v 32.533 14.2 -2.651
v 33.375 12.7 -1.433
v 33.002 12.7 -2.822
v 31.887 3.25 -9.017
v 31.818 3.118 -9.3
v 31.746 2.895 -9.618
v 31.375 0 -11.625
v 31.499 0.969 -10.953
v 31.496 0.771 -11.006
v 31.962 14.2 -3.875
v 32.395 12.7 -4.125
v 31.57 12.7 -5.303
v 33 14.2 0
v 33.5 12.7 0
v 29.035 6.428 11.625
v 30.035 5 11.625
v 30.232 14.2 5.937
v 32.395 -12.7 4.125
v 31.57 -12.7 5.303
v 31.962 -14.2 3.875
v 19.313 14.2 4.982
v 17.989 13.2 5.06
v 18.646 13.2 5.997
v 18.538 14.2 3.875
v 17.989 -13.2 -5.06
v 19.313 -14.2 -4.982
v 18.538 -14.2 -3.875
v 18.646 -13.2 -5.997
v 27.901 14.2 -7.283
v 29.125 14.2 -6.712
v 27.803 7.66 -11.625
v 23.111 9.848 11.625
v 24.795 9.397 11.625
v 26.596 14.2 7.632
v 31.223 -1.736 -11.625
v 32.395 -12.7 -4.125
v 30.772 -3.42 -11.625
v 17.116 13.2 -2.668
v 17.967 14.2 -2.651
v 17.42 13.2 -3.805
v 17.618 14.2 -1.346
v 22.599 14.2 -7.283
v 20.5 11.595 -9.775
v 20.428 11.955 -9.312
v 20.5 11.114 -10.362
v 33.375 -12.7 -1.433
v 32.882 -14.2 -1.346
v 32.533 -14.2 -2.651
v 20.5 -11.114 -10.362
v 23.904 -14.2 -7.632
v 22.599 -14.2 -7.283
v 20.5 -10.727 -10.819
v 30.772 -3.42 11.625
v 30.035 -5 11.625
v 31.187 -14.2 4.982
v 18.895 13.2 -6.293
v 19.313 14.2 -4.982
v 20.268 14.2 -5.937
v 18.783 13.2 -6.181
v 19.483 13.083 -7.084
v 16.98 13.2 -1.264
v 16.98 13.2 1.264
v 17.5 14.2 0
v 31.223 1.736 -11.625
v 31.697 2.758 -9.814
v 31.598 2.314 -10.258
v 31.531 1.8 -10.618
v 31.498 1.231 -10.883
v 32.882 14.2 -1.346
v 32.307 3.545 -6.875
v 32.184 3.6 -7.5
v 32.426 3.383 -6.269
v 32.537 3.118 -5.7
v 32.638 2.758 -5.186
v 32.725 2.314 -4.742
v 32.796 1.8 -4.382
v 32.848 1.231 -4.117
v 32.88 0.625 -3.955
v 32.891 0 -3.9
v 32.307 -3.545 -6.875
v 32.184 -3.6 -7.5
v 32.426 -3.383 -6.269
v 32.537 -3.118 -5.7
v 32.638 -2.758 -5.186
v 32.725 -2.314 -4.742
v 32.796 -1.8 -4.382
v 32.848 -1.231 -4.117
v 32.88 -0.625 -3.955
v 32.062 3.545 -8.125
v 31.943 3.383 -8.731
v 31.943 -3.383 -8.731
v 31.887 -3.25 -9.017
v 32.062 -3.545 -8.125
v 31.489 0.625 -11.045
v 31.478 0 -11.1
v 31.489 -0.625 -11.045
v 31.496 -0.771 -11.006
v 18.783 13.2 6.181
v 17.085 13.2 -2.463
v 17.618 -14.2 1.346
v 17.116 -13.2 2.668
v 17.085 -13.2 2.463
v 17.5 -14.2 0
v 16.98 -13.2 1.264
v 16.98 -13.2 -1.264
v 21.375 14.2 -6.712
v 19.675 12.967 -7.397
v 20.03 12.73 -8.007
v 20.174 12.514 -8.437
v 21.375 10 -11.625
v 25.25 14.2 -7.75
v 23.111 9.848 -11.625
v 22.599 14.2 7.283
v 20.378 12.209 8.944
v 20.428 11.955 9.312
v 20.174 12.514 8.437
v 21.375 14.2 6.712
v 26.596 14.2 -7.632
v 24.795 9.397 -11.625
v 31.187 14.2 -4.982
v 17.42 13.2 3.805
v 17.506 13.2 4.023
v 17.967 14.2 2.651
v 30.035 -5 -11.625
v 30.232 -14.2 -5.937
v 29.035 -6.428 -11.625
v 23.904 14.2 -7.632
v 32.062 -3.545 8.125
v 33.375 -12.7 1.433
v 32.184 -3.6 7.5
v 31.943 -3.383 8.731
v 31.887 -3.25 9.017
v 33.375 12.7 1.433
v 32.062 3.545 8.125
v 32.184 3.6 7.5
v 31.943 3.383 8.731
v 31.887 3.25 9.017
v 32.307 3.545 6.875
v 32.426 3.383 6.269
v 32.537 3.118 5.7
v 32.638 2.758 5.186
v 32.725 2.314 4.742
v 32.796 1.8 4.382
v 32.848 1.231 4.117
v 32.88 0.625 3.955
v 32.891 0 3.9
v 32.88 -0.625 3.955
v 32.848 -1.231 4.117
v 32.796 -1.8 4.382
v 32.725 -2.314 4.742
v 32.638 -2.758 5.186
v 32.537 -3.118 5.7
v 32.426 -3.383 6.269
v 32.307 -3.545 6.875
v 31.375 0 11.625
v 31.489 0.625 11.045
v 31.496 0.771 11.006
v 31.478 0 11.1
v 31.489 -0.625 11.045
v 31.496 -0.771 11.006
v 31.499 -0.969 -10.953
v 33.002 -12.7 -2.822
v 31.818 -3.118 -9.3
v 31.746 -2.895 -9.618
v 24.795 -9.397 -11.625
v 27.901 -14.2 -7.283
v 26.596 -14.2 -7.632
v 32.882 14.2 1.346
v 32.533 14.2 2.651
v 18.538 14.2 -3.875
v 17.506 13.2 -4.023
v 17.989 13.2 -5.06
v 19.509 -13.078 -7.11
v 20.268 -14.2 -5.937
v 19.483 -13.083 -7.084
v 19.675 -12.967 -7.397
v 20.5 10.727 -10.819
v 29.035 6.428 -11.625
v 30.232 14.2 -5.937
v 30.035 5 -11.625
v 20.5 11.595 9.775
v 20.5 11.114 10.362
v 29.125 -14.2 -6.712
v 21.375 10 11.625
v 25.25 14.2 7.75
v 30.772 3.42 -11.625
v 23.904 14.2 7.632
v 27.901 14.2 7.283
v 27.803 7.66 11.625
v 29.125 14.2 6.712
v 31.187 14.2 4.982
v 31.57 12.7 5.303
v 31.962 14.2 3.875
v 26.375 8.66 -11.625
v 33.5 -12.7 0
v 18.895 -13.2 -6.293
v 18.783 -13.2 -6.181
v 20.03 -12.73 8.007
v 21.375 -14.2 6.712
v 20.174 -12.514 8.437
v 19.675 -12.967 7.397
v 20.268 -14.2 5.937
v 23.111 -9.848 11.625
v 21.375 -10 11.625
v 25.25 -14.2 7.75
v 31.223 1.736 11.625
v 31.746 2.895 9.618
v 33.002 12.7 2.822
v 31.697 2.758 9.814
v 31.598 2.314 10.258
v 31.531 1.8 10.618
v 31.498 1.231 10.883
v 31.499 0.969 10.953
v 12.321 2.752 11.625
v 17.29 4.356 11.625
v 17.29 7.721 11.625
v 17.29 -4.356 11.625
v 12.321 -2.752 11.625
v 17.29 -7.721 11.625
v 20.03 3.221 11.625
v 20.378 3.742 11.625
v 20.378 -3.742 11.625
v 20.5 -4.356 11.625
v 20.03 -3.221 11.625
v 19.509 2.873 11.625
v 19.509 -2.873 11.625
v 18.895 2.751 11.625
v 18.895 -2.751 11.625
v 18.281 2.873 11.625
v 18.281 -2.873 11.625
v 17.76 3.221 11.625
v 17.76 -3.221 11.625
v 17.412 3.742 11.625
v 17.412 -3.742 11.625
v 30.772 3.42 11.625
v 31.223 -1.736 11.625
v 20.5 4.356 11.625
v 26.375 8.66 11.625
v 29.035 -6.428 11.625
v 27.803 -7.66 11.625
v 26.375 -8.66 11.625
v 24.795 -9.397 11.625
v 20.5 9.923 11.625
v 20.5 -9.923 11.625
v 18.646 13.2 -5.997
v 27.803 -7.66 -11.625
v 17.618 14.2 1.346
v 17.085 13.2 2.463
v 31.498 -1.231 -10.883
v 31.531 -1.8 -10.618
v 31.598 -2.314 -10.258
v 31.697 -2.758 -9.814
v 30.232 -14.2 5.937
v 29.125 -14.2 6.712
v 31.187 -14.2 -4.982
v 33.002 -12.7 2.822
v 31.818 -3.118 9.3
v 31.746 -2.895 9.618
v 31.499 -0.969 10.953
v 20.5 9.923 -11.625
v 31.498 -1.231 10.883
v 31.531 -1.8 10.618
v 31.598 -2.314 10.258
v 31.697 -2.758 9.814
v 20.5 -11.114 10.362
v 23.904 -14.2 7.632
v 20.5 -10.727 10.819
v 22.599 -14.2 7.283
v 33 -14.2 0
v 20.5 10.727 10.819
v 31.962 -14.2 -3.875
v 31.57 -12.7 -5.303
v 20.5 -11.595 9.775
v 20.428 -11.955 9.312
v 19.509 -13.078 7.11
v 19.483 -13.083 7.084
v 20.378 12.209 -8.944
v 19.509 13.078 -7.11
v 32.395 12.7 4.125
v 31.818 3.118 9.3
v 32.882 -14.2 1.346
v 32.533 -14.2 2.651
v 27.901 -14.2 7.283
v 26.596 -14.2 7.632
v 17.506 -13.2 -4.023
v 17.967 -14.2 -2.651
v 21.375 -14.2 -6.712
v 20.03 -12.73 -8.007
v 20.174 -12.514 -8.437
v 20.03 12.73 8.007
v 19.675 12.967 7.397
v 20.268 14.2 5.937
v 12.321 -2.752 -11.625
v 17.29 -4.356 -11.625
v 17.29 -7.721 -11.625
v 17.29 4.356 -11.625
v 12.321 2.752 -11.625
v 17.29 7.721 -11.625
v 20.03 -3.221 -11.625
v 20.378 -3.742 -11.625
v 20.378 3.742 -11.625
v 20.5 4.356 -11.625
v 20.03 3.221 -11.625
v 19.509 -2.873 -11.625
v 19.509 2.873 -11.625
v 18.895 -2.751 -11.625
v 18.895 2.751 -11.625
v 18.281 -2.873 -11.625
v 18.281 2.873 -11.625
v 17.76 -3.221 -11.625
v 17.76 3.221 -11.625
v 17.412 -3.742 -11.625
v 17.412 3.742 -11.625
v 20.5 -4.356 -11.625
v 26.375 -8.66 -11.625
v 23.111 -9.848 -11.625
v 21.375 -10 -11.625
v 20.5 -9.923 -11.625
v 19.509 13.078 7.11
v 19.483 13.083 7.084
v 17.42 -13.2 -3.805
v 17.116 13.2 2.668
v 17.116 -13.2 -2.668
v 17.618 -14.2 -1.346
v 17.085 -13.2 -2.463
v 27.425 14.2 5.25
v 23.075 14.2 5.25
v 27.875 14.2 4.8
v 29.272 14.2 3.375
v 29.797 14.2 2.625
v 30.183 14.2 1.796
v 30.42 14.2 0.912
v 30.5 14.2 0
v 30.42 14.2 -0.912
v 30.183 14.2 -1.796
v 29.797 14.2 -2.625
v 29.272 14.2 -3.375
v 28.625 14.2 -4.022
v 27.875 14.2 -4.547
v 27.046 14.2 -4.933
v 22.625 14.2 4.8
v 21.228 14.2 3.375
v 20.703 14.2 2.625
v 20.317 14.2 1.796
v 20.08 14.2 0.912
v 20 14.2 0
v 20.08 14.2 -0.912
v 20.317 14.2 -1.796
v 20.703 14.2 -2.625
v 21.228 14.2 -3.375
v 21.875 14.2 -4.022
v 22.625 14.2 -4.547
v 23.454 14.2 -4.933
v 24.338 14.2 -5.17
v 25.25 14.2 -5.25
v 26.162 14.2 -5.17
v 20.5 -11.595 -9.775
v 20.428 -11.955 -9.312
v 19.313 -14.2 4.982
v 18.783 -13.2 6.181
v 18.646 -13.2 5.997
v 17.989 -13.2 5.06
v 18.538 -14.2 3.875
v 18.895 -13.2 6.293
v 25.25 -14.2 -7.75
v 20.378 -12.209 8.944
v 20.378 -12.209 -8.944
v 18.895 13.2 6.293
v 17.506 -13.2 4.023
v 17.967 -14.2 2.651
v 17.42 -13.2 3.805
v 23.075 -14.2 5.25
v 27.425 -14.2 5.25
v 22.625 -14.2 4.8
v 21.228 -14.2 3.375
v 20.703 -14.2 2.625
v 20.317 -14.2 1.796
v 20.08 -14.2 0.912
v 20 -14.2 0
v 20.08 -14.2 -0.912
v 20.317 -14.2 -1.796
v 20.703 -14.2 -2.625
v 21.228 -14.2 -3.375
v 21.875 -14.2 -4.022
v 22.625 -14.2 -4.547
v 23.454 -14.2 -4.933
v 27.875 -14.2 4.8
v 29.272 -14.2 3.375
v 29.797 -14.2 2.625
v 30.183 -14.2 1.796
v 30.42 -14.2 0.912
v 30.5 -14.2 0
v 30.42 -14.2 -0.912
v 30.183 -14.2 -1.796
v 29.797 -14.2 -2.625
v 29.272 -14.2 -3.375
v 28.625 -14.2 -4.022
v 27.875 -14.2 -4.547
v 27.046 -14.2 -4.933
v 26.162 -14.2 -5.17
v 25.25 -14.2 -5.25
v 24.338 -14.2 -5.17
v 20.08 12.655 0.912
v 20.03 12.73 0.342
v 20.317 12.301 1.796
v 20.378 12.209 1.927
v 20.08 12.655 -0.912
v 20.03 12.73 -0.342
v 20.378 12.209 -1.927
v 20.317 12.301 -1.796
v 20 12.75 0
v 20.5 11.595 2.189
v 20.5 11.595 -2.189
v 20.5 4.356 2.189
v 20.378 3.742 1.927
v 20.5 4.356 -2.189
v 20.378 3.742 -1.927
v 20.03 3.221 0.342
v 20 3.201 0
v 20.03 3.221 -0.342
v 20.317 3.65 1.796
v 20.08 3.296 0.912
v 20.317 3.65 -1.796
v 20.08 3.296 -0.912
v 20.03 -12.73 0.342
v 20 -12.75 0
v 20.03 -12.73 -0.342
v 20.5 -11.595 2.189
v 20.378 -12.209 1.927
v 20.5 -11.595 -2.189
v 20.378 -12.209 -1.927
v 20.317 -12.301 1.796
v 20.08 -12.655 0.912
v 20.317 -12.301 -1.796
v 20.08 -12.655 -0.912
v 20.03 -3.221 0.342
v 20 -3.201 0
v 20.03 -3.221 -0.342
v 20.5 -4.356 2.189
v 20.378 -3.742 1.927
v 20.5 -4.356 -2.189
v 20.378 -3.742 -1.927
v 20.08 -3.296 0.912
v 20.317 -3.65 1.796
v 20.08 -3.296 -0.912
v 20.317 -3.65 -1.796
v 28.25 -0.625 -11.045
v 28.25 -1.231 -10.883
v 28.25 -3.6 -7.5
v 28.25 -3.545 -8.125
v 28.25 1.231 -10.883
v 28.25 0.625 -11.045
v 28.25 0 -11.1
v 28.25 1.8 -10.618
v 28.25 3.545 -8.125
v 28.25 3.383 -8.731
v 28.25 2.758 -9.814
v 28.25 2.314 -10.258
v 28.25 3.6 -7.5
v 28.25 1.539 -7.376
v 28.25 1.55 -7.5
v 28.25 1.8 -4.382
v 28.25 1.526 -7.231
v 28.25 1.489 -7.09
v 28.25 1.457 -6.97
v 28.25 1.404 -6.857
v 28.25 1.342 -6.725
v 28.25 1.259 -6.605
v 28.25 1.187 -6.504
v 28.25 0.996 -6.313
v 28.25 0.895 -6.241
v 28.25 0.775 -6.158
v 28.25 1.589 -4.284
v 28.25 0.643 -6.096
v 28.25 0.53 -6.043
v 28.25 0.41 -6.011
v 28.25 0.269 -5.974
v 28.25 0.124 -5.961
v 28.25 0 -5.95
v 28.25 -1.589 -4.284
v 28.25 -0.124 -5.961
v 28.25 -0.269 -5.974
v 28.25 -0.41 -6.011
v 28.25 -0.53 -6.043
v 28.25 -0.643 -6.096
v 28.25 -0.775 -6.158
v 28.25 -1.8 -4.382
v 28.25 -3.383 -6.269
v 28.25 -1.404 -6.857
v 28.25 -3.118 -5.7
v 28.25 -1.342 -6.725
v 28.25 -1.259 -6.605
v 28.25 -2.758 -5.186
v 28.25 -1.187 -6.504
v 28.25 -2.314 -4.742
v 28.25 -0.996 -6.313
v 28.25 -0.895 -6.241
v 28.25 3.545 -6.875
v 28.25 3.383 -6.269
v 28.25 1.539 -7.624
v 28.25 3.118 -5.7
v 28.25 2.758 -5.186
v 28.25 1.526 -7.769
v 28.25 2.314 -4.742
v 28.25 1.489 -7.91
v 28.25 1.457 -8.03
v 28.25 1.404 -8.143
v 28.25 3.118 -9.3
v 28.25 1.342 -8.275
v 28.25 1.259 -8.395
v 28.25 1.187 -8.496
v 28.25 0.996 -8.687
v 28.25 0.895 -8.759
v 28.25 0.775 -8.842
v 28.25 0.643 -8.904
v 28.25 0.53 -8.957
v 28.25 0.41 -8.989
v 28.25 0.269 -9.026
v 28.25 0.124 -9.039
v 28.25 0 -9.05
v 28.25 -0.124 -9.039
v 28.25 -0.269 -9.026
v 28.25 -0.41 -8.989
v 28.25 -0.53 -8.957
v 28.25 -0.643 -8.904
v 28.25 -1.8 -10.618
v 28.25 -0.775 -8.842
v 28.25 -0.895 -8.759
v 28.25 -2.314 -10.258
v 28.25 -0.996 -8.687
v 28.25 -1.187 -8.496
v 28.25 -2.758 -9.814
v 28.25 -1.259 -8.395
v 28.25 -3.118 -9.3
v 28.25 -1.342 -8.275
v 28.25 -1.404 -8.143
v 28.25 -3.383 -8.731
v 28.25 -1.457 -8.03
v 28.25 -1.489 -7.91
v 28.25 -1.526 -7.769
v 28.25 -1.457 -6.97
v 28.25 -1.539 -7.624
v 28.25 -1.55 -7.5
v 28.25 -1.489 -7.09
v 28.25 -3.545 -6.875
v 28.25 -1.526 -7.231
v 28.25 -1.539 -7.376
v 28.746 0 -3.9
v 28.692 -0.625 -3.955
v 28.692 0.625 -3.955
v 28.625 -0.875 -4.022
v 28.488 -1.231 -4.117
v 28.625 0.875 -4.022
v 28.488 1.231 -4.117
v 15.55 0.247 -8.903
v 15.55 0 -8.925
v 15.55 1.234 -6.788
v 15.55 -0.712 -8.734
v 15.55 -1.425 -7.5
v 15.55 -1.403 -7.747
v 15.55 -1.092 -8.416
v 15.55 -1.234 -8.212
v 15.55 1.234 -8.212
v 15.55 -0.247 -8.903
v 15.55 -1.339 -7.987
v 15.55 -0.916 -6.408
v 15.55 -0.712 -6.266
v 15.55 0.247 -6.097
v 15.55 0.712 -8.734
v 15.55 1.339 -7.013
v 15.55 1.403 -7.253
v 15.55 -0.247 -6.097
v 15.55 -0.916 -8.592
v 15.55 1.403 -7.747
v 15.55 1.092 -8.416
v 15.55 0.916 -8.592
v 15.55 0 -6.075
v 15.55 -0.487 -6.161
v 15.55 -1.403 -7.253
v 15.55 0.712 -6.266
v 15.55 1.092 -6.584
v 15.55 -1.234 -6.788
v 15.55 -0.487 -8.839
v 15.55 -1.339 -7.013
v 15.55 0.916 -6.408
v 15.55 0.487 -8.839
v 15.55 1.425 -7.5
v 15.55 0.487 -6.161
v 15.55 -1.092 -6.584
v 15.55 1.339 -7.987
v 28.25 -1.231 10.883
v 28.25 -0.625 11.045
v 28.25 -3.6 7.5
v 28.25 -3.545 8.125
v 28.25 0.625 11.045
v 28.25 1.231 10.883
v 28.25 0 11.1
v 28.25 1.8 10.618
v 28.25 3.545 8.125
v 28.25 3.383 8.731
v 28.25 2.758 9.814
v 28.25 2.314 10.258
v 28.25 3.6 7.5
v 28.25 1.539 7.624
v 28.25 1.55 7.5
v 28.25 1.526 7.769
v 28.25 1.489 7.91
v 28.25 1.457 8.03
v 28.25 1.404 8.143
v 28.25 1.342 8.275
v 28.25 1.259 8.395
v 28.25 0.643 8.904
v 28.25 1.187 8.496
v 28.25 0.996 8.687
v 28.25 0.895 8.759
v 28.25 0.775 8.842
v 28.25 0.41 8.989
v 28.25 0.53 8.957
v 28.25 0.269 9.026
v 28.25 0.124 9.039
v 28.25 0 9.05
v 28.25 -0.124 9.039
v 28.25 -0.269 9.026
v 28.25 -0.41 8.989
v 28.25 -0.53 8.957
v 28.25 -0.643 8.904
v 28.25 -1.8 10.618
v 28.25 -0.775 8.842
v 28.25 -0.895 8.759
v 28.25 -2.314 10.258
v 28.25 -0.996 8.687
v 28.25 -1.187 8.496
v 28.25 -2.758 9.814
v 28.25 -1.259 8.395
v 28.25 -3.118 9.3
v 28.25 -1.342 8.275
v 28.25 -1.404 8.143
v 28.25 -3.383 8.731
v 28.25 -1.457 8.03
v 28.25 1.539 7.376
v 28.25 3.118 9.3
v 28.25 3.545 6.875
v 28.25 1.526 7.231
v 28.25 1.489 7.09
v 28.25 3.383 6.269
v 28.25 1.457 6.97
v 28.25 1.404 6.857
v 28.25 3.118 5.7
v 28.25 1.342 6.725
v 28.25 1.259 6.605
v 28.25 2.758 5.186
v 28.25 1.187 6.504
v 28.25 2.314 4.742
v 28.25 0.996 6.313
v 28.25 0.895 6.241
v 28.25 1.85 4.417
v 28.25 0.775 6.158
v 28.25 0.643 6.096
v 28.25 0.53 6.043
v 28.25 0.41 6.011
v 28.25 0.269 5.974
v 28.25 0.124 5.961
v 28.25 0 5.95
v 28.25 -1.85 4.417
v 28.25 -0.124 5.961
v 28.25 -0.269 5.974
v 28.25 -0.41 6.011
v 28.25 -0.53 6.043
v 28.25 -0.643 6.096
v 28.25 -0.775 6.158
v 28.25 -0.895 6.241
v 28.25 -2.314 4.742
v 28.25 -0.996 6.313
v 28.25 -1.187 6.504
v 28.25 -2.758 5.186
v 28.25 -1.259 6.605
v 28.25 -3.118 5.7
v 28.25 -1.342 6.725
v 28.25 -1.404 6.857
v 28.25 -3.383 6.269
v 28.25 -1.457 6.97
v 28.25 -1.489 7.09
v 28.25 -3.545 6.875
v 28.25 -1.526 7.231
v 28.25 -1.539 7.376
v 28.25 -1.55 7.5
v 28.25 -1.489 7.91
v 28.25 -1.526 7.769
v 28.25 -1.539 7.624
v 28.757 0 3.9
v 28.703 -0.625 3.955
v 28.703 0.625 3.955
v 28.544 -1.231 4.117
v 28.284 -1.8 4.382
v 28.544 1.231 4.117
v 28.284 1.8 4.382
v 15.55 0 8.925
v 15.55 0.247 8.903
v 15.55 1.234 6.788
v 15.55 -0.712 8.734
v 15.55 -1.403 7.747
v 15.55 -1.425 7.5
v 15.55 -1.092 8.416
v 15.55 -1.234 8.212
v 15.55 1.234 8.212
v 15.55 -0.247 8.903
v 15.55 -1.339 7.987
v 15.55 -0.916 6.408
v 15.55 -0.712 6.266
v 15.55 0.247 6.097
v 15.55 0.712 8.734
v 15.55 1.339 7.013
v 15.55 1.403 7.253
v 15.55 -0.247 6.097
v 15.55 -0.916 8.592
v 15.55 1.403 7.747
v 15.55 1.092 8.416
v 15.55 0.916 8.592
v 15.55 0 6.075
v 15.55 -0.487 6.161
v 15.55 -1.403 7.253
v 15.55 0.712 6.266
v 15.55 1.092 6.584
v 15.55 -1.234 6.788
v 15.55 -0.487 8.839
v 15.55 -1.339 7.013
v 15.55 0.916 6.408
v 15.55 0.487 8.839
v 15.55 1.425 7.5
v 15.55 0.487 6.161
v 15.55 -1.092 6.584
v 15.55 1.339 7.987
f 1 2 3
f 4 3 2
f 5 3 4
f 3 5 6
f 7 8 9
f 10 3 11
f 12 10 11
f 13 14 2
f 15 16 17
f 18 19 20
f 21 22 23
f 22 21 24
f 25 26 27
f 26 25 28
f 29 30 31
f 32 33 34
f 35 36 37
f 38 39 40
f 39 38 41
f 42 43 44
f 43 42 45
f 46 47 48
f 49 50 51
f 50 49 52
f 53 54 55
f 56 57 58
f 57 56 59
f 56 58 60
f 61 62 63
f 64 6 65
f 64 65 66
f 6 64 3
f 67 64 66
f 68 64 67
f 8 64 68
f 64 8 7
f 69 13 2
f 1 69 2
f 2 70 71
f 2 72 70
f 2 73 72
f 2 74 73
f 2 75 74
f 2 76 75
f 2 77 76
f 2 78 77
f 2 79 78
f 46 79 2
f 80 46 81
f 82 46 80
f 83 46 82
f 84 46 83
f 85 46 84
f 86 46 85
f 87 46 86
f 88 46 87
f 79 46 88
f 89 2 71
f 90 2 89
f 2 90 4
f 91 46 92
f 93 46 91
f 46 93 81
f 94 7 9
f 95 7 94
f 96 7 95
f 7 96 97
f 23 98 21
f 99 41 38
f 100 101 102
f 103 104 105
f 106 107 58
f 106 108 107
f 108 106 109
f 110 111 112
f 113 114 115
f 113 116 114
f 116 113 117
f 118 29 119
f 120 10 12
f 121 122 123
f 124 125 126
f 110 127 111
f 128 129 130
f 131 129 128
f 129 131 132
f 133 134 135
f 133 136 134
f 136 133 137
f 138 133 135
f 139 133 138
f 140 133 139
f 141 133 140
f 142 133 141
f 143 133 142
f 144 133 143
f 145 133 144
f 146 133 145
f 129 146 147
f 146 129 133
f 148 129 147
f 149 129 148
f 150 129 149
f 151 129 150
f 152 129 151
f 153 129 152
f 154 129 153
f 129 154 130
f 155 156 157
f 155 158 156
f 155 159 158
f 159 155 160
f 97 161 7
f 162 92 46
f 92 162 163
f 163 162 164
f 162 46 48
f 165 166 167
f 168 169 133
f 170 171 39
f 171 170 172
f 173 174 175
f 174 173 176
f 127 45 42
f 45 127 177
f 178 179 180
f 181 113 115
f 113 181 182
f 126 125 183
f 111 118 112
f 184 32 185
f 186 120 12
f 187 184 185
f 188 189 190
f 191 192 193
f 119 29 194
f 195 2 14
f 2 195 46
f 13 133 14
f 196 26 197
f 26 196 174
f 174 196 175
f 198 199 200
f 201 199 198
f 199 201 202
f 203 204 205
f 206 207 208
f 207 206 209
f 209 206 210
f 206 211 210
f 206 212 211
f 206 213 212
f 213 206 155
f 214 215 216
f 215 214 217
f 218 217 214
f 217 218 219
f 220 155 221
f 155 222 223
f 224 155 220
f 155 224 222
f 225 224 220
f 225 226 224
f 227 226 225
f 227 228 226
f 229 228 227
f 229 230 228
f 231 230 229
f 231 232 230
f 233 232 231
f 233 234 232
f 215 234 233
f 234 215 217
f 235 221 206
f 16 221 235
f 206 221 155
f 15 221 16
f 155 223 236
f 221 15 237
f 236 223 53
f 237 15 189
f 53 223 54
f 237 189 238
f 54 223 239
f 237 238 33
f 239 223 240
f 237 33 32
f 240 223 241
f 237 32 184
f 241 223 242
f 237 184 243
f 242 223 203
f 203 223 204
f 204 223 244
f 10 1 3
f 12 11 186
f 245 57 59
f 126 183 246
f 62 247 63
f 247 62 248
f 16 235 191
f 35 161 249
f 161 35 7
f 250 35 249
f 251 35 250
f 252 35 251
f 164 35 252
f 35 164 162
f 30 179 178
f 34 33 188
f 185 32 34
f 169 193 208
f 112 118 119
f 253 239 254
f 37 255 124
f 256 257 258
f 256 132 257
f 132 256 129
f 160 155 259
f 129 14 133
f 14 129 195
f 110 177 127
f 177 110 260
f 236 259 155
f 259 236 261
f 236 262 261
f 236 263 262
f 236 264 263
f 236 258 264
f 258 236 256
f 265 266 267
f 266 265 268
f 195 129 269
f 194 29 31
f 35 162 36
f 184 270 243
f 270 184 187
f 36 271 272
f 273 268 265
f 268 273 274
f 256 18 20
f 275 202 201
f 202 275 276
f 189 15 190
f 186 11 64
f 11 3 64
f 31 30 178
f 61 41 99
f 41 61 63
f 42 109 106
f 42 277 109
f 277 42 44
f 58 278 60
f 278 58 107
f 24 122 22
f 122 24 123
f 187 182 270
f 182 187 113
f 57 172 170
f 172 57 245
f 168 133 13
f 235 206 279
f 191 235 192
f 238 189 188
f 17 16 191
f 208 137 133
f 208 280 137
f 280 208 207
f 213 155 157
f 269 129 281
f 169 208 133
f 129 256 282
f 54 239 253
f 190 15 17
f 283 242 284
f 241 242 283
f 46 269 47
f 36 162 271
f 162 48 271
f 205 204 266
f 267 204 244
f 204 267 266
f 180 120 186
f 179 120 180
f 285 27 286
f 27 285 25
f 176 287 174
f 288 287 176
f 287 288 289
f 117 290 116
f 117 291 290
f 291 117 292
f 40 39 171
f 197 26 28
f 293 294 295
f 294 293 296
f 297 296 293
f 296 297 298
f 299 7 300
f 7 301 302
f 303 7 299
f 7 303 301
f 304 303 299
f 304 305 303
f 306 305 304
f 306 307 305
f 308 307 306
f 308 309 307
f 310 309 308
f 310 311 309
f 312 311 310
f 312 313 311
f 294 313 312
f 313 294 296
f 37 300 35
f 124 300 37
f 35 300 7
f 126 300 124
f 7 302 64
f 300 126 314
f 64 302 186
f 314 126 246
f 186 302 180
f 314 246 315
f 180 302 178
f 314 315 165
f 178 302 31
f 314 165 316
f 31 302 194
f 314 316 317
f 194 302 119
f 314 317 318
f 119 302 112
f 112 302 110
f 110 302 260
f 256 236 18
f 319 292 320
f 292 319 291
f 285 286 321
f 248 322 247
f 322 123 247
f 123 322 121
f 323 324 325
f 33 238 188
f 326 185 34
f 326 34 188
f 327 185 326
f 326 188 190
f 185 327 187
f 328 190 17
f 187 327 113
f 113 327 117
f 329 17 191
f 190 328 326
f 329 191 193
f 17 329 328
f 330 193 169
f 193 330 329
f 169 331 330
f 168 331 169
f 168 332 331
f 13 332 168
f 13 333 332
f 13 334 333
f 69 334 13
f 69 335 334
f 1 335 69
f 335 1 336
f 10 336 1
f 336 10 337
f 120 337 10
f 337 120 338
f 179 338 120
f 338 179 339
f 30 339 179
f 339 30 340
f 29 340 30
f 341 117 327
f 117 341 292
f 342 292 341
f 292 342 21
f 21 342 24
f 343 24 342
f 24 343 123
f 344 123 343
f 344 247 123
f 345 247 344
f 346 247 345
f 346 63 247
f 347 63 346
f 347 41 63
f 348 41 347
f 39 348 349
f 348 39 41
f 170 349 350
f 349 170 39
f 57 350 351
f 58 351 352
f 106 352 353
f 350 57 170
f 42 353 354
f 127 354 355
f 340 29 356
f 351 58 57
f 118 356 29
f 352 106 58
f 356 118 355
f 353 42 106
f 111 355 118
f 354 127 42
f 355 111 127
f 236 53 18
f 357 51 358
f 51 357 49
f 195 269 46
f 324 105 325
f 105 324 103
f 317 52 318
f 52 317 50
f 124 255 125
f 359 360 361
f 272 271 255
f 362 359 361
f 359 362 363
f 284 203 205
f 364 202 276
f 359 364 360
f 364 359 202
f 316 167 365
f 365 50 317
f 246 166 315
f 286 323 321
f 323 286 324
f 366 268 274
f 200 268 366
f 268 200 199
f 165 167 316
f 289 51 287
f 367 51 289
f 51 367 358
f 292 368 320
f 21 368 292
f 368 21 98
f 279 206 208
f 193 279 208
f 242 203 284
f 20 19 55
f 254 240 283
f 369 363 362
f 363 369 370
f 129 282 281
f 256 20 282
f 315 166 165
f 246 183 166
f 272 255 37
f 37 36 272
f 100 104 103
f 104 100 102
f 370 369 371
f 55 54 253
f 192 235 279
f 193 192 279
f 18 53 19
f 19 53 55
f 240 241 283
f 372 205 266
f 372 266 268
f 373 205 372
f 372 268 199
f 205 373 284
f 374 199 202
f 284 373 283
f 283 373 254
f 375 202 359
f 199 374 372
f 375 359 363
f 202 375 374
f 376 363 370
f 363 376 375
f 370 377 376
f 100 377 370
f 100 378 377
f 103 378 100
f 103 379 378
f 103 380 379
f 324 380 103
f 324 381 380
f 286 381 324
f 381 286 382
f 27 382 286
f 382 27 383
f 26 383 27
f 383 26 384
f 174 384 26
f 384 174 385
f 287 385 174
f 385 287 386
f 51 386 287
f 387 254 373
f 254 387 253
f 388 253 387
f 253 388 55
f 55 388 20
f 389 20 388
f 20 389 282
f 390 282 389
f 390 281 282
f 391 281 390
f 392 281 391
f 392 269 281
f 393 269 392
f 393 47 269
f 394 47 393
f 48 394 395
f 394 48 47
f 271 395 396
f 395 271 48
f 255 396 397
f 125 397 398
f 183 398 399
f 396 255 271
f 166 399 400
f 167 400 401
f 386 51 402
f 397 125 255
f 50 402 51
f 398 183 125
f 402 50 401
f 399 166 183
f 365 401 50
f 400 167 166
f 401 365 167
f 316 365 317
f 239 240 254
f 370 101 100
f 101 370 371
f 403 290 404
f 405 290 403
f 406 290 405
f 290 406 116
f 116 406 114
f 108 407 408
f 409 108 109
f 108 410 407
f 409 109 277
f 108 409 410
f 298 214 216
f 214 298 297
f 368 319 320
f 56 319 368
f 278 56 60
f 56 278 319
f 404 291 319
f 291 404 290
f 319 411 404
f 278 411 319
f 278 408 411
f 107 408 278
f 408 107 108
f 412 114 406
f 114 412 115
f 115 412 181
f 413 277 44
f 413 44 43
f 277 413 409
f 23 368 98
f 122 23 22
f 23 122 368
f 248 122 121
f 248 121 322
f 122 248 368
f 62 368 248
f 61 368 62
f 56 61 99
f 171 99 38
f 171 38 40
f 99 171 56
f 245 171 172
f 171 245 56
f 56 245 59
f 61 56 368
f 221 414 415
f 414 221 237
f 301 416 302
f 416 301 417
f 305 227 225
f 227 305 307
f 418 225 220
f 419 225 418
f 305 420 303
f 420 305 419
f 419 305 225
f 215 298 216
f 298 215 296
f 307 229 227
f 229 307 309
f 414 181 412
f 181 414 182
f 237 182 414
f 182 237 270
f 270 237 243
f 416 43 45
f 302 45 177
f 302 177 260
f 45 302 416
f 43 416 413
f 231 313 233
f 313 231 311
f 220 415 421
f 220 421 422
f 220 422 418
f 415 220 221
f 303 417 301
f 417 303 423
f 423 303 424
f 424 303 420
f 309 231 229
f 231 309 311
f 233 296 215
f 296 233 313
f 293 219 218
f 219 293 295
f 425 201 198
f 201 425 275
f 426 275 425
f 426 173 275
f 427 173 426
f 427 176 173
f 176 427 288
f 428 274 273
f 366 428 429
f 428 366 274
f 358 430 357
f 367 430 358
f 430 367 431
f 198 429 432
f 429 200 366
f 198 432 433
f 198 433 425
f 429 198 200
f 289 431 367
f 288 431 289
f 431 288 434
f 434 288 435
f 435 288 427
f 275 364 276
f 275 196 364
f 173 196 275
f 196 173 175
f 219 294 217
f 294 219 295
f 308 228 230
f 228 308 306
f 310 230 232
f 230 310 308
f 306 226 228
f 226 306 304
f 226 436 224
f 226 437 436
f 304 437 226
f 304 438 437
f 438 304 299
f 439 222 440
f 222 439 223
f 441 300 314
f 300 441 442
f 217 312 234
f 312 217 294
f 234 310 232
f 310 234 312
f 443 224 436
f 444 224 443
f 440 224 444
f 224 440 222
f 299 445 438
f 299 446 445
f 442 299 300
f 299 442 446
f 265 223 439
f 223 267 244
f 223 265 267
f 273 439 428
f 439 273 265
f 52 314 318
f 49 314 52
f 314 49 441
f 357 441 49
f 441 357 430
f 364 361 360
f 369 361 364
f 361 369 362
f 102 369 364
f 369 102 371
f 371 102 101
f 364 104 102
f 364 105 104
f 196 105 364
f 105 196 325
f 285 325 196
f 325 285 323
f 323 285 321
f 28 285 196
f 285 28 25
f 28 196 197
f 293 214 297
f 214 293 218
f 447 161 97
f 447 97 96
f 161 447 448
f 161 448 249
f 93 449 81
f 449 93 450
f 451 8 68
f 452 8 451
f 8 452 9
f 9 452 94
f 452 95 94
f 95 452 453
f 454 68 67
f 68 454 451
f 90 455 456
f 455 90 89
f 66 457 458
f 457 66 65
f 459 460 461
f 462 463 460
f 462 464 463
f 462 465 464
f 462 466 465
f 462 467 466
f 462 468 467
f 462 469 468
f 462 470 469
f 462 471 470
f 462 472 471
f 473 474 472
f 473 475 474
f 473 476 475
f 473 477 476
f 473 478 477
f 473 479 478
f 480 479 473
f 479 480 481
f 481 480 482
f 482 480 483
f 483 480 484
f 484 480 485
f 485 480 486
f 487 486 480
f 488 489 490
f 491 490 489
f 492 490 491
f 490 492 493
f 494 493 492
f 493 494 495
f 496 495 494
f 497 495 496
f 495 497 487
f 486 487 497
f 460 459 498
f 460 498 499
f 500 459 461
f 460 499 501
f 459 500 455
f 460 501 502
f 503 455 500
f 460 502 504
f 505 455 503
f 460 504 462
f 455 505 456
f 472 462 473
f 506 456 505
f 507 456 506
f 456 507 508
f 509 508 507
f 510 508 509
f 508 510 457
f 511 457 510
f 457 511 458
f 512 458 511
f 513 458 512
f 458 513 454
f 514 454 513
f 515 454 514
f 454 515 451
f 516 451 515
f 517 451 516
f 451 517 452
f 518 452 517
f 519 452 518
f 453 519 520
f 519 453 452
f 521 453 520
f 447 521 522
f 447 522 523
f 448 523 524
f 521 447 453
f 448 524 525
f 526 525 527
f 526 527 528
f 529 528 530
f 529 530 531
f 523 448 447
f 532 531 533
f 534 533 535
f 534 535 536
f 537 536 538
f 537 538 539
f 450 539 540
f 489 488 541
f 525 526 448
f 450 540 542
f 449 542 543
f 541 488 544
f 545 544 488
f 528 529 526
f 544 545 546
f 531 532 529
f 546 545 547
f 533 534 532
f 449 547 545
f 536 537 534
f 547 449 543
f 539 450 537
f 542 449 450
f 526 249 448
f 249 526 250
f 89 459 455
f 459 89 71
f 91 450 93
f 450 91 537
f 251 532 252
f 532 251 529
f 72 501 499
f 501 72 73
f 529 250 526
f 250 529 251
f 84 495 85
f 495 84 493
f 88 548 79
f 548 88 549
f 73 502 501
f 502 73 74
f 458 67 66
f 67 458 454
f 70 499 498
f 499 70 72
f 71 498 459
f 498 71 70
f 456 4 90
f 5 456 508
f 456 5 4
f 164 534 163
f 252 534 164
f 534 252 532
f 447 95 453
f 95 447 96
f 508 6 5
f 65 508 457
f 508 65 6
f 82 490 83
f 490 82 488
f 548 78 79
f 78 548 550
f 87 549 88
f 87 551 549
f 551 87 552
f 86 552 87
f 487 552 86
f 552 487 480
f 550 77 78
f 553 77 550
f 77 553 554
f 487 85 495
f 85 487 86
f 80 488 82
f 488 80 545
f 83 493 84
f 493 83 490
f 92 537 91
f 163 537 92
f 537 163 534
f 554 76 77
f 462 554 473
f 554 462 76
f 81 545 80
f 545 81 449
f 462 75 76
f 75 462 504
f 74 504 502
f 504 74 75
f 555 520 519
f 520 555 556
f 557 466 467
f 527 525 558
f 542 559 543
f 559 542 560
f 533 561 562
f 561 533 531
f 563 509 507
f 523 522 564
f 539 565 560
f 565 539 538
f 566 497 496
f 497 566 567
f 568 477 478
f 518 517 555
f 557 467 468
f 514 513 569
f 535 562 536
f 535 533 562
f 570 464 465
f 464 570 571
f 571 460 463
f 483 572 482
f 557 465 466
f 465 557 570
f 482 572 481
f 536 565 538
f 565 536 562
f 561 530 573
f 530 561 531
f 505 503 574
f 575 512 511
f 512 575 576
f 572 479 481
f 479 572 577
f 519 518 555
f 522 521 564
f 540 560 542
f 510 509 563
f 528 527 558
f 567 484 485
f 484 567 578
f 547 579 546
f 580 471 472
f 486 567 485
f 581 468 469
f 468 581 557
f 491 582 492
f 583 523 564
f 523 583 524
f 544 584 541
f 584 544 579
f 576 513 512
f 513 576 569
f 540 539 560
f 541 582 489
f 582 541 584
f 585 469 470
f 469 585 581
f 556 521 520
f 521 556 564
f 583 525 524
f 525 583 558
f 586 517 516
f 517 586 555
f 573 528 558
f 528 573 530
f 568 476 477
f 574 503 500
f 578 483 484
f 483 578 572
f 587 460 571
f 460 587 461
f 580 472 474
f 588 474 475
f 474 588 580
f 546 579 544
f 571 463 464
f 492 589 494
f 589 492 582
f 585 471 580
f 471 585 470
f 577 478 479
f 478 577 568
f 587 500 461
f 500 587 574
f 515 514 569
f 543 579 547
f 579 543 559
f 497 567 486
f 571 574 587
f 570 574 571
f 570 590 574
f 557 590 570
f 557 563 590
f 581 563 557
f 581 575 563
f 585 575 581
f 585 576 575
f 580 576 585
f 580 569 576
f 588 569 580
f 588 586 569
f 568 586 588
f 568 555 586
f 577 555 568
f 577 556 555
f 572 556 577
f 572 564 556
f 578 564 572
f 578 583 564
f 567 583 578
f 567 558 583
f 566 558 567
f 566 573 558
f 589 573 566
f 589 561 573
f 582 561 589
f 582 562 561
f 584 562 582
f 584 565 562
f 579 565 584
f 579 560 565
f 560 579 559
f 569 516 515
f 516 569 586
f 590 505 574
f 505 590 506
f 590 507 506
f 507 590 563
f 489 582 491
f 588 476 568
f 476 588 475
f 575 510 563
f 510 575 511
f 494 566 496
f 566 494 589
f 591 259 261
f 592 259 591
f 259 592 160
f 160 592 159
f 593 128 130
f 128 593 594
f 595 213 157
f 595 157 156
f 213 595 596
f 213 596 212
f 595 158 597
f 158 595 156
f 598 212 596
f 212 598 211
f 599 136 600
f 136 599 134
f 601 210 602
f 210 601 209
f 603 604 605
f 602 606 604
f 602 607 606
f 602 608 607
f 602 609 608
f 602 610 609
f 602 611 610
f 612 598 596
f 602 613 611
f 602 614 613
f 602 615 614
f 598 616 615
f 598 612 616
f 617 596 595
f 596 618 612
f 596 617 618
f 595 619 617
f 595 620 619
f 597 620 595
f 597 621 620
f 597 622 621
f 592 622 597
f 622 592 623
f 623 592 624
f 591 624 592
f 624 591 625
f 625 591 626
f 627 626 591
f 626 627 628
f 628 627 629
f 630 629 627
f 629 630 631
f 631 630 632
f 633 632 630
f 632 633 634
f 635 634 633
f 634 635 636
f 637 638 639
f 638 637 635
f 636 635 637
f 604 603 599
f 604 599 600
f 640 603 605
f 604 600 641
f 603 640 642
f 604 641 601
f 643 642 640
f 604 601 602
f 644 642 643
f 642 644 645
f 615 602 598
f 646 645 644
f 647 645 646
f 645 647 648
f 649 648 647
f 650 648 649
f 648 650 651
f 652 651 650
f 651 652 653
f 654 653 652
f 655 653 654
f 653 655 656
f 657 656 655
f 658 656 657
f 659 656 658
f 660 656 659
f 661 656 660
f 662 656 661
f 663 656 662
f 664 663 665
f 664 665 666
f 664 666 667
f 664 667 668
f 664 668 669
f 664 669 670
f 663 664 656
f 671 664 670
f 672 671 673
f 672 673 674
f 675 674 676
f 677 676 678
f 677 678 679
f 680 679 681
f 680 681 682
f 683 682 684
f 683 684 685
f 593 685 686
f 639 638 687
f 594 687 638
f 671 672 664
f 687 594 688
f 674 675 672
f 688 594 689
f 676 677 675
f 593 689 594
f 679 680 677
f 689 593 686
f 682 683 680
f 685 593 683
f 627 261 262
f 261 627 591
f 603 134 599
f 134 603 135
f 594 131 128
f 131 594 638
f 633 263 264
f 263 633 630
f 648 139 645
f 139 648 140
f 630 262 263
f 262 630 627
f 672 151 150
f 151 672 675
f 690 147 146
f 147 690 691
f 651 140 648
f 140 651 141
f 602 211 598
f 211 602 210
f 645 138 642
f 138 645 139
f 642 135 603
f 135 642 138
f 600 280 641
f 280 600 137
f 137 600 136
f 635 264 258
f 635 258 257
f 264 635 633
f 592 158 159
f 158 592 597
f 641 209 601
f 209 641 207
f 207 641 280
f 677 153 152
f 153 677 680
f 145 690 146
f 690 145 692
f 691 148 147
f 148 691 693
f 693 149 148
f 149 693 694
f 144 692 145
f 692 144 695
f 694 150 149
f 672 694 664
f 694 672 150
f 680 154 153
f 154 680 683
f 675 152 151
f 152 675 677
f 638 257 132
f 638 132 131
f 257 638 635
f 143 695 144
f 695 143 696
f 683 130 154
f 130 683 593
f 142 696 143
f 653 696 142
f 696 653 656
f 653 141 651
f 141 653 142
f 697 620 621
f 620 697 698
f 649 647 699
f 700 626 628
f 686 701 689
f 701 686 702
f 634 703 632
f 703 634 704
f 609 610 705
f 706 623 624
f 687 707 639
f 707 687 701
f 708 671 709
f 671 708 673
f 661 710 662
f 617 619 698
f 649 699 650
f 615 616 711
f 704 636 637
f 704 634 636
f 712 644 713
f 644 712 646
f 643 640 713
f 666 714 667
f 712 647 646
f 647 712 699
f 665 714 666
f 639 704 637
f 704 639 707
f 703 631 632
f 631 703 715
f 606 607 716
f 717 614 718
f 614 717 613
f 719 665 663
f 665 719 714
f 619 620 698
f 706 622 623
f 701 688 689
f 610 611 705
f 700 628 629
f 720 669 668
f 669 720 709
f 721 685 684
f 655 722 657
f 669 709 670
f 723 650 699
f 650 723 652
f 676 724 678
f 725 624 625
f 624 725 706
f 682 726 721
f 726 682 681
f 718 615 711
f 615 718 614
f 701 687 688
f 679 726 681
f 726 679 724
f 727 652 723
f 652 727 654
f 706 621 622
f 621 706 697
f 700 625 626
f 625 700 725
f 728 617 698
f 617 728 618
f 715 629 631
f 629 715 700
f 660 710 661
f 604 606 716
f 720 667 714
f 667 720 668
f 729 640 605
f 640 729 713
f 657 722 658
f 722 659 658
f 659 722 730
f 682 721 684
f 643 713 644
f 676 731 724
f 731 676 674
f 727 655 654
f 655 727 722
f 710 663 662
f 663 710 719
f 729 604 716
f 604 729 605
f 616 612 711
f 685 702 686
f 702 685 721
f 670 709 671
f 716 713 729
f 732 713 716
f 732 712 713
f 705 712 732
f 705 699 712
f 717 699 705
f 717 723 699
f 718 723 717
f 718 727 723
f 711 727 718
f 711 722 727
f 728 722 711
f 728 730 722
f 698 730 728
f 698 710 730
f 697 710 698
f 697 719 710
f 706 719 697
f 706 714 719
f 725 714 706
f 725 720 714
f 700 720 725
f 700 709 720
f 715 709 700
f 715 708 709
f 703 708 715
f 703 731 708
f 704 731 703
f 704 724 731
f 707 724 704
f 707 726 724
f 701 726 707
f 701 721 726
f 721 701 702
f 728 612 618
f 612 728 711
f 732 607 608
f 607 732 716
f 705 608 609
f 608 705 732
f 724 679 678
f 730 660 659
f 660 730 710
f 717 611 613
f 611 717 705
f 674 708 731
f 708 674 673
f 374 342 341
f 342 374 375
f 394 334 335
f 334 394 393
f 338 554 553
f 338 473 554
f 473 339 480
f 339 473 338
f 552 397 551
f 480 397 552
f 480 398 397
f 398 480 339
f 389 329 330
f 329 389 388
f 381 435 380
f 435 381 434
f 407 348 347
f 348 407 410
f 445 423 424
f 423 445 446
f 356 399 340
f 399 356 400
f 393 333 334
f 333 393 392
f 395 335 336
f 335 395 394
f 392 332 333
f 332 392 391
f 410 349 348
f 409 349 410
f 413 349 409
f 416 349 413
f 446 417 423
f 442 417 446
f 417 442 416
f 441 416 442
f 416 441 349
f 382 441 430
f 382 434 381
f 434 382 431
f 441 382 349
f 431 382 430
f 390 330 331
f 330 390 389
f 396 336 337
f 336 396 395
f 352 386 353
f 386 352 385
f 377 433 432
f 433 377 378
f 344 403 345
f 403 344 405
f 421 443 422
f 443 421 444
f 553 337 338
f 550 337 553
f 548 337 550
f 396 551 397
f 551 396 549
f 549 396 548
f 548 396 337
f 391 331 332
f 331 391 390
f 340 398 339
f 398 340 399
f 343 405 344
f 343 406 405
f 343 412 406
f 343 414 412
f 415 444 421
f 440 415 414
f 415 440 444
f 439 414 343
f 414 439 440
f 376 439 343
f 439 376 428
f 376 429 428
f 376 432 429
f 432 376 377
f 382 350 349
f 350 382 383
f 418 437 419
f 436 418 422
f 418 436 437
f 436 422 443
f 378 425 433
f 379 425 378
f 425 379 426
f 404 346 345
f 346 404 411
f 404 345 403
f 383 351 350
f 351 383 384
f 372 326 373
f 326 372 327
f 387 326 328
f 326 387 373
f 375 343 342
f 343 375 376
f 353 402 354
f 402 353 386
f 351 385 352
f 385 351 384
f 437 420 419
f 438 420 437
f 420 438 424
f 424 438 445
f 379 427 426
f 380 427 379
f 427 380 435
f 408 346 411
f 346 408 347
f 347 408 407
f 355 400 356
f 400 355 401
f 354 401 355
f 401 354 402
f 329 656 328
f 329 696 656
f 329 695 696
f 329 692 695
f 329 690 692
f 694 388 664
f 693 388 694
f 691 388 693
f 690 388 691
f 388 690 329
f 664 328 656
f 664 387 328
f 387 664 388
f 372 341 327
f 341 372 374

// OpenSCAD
in = 25.4;

//%extrusion();

$fn=72;

//translate([25,0,0]) mirror([0,0,1])
//rambo_mount();

//this is for the pi... it has less clearance around its holes, but otherwise identical
//mirror([0,0,1]) rambo_mount(nub_rad = 4, length = in/2);

translate([20,0,0]) rotate([0,90,0]) rod_mount(rod_rad = 5.25, extrusion=true);
//rod_mount(rod_rad = 5.25, extrusion=false);

//spring_mount();

rod_rad = 4.25;
screw_rad = 1.8;
wall = 3;

$fn=36;

module rod_mount(extrusion=false){
    screw_sep = 15;
    difference(){
        union(){
            //rod mount
            hull() {
                translate([0,0,rod_rad]) rotate([90,0,0]) {
                    cylinder(r=rod_rad+wall, h=in, center=true);
                    cylinder(r=rod_rad+wall-.5, h=in+wall, center=true);
                }
                
                if(extrusion == true)
                    translate([0,0,-rod_rad/2+4]) rotate([0,90,0]) {
                    cylinder(r=10, h=screw_sep+wall*2.75, center=true);
                }
            }
            
            //screwholes
            hull(){
                for(i=[0,1]) mirror([i,0,0]) translate([screw_sep/2,0,0]){
                    cylinder(r=screw_rad+wall, h=wall*3-1);
                    cylinder(r=screw_rad+wall-.5, h=wall*3);
                }
                for(i=[0,1]) mirror([0,i,0]) translate([0,screw_sep/2,0]){
                    cylinder(r=screw_rad+wall, h=wall);
                }
            }
        }
        
        if(extrusion == true){
            translate([0,0,-in/2]) rotate([0,90,0]) extrusion(slop = 1);
        }else{
            translate([0,0,-in/2]) cube([in*5,in*5,in], center=true);
        }
        
        //screwholes
        for(i=[0,1]) mirror([i,0,0]) translate([screw_sep/2,0,wall*2.75]){
            cylinder(r=screw_rad*2, h=wall*2, $fn=36);
            cylinder(r1=screw_rad-.375, r2=screw_rad-.125, h=in, center=true);
        }
        
        //rod
        if(extrusion == true){
            translate([0,0,rod_rad]) rotate([90,0,0]) rotate([0,0,180]) cap_cylinder(r=rod_rad, h=in*2, center=true);
        }else{
            translate([0,0,rod_rad]) rotate([90,0,0]) rotate([0,0,90]) cap_cylinder(r=rod_rad, h=in*2, center=true);
        }
        
        //smooth the top and bottom
        for(i=[0,1]) mirror([i,0,0]) translate([50+screw_sep/2+wall*2.75/2,0,0]) cube([100,100,100], center=true);
    }
}


slot_width = in*9/16;

module spring_mount(height=7){
    rotate([90,0,0]) difference(){
        union(){
            intersection(){
                rotate([90,0,0]) hull() {
                    cylinder(r=slot_width/2,h=height/2+in/2);
                    cylinder(r=slot_width*.333,h=height+in/2);
                }
                translate([0,0,-25]) rotate([0,0,-135]) cube([50,50,50]);
                translate([-25,-5,-25]) rotate([0,0,-90]) cube([50,50,50]);
            }
        }
        extrusion(slop = 1);
        rotate([90,0,0]) cylinder(r1=screw_rad-.375, r2=screw_rad-.125, h=height+in/2+.1); 
    }
}

module rambo_mount(angle = 90-35, lift = in*2, length = in*7/8, nub_rad = 6){
    slot_width = in*9/16;
    wall = 4;
    
    screw_rad = 1.25;
    difference(){
        union(){
            //slot tabs
            intersection(){
                union(){
                    translate([in/2,0,0]) cube([in, slot_width, length], center=true);
                    rotate([0,0,90]) translate([in/2,0,0]) cube([in, slot_width, length], center=true);
                }
                rotate([0,0,45]) translate([in/2,0,0]) cube([in, in, length], center=true);
            }
            
            //board rest
            translate([0,lift,0]) rotate([0,0,angle]) translate([0,-in*1/2,0]) cube([wall, length, length], center=true);
            
            //board nub
            translate([0,lift,0]) rotate([0,0,angle]) translate([wall/2,-in*1/2,-length/2+nub_rad-1]) {
                rotate([0,90,0]) cylinder(r=nub_rad, h=wall, center=true);
            }
            
            //join the board rest and the nub
            difference(){
                hull(){
                    translate([0,lift,0]) rotate([0,0,angle]) translate([0,-in*1/2,0]) cube([wall, length, length], center=true);
                    rotate([0,0,45]) translate([in/2,0,0]) cube([in, in, length], center=true);
                }
                hull() extrusion(slop = 1);
            }
        }
        extrusion(slop = .75);
        
        cylinder(r=5, h=50, center=true);
        
        //screwhole
        translate([0,lift,0]) rotate([0,0,angle]) translate([wall,-in*1/2,-length/2+nub_rad-1]) {
            rotate([0,90,0]) cylinder(r=screw_rad, h=wall*5, center=true);
        }
        
        //flatten the bottom
        translate([0,0,-50-length/2]) cube([100,100,100], center=true);
        
        //flatten the back
        translate([50+in*3/4,0,0]) cube([100,100,100], center=true);
    }
}

module extrusion_lug(length = in){
    slot_width = in*9/16;
    difference(){
        union(){
            hull(){
                //slot tab
                intersection(){
                    translate([in/2,0,0]) cube([in*3/4, slot_width, length], center=true);
                    translate([in/2*sqrt(2),0,0]) rotate([0,0,45]) cube([in, in, length], center=true);
                }
            }
        }
        extrusion(slop = .25);
    }
}


module extrusion(length = in*3, slop = .1, $fn=16){
    center_cube = .356*in+slop;
    inner_wall = .087*in+slop;
    slot = .256*in-slop;
    difference(){
        union(){
            //center cube
            cube([center_cube, center_cube, length], center=true);
            
            //four corners
            for(i=[0:90:359]) rotate([0,0,i]) {
                //inner walls
                hull(){
                    translate([in/2-inner_wall/2+slop/2,in/2-inner_wall/2+slop/2,0]) cylinder(r=inner_wall/2, h=length, center=true);
                    cylinder(r=inner_wall/2, h=length, center=true);
                }
                
                //corners
                hull(){
                    translate([in/2-inner_wall/2+slop/2,in/2-inner_wall/2+slop/2,0]) cylinder(r=inner_wall/2, h=length, center=true);
                    translate([in/2-inner_wall/2+slop/2,slot/2+inner_wall/2,0]) cylinder(r=inner_wall/2, h=length, center=true);
                }
                hull(){
                    translate([in/2-inner_wall/2+slop/2,in/2-inner_wall/2+slop/2,0]) cylinder(r=inner_wall/2, h=length, center=true);
                    translate([slot/2+inner_wall/2,in/2-inner_wall/2+slop/2,0]) cylinder(r=inner_wall/2, h=length, center=true);
                }
            }
        }
        
        //center hole
        cylinder(r=.205*in/2, h=length+.1, center=true);
    }
}

//A cylinder with a flat on it - used for printing overhangs, mainly.
//
//When printing an axle, put the flat spot downwards - it'll make the bottom much cleaner.
//When printing an axle hole, put the flat spot upwards - it'll make the ceiling cleaner.
module cap_cylinder(r = 3, h=5, center=true, outside=true, r_slop=0){
    difference(){
        hull(){
            cylinder(r=r-r_slop, h=h, center=center);
        
            if(outside == true){
                intersection(){
                    translate([r/2,0,0]) cube([r,r,h], center=center);
                    cylinder(r=(r-r_slop)/cos(180/4), h=h, center=center, $fn=4);
                }
            }
        }
        
        //this makes it into a D-shaft, basically.
        if(outside == false){
            translate([r,0,0]) cube([r/6,r,h+1], center=center);
        }
    }
}
